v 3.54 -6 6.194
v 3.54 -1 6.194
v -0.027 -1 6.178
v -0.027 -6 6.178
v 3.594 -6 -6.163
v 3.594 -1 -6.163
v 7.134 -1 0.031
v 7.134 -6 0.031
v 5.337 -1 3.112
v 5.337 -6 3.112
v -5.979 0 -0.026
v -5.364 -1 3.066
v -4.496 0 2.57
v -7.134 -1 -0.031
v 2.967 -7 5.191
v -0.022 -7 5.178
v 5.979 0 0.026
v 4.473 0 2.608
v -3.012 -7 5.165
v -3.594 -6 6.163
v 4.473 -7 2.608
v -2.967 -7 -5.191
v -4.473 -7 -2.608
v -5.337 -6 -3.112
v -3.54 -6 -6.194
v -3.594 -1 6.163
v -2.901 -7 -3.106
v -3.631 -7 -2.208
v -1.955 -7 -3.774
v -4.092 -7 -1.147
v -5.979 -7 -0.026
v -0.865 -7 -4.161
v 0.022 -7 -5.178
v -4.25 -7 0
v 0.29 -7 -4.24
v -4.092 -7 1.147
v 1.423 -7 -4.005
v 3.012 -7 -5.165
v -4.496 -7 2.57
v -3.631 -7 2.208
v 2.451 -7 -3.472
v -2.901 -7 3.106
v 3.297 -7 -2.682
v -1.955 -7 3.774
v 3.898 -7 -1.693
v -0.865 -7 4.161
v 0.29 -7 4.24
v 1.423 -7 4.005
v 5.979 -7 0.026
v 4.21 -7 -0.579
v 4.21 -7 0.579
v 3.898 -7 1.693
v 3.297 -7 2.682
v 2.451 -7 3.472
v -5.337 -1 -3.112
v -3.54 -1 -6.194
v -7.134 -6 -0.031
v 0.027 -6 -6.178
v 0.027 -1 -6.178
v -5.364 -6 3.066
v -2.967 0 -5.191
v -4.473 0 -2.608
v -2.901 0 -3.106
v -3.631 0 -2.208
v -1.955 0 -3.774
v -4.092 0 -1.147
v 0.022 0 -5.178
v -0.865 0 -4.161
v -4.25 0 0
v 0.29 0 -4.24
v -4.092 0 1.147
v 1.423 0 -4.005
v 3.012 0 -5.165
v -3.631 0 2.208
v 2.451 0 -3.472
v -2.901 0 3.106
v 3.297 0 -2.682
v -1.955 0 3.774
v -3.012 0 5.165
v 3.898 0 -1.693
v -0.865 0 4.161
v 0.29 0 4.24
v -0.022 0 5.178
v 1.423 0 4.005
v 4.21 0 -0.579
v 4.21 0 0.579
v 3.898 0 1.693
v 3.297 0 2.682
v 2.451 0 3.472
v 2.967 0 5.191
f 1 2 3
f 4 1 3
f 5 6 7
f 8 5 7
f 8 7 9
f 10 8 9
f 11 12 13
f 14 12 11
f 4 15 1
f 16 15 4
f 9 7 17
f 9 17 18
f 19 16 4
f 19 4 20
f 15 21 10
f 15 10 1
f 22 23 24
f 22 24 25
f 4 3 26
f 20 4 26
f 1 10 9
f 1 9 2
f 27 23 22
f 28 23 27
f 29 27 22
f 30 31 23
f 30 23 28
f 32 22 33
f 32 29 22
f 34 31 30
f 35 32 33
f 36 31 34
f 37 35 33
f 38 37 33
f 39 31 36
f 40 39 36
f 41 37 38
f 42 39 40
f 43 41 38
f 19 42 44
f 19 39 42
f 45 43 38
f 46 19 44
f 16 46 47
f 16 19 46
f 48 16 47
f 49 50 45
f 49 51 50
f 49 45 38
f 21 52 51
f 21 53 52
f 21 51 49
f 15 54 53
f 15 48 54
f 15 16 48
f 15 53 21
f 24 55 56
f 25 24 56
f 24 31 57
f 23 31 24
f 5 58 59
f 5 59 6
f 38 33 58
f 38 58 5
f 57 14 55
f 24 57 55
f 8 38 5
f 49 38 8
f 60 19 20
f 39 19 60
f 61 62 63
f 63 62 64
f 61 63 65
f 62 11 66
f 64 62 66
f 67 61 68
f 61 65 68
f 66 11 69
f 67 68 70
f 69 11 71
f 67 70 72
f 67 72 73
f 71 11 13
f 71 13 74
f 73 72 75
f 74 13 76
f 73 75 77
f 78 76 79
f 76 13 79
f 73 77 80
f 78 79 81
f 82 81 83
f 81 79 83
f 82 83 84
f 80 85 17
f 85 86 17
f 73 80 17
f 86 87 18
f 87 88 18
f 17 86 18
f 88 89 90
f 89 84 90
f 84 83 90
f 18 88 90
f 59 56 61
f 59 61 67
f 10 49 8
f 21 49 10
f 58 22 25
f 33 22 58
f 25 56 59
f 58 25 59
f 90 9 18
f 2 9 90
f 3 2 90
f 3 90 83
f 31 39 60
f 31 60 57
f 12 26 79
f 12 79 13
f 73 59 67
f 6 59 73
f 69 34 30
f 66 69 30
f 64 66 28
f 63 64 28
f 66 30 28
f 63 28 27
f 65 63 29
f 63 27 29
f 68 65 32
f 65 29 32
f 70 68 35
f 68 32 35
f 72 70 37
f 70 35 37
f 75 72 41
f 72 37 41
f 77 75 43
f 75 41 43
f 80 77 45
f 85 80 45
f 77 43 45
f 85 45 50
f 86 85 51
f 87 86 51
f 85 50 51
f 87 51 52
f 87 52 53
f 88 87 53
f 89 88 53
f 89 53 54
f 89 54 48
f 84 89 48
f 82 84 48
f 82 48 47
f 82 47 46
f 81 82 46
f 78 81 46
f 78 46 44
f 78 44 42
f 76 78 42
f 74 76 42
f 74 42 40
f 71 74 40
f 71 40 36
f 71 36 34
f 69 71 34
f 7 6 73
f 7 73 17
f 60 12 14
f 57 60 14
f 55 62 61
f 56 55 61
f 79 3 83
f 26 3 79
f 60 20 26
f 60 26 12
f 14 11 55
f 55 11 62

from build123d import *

# Parameters (mm, degrees)
F1_DEPTH = 7
F2_SIZE  = 1
F3_SIZE  = 1
F4_D     = 8.5


with BuildPart() as f1:
    # F0 (on Front) → F1 (new body)
    with BuildSketch(Plane.XZ):
        with BuildLine():
            ThreePointArc((5.3637862302, -3.0659549776), (5.9711339811, -1.5861404815), (6.178210311, 0))
            ThreePointArc((6.178210311, 0), (5.9642239682, 1.6119290011), (5.3370880527, 3.1121975781))
            ThreePointArc((5.3370880527, 3.1121975781), (3.0659549821, 5.3637862276), (-0.0266982871, 6.1781526243))
            ThreePointArc((-0.0266982871, 6.1781526243), (-3.1121976822, 5.337087992), (-5.3637862362, 3.065954967))
            ThreePointArc((-5.3637862362, 3.065954967), (-6.1781526243, -0.0266982826), (-5.3370879532, -3.1121977488))
            ThreePointArc((-5.3370879532, -3.1121977488), (-3.0659548546, -5.3637863004), (0.026698383, -6.1781526239))
            ThreePointArc((0.026698383, -6.1781526239), (3.1121977184, -5.3370879709), (5.3637862302, -3.0659549776))
        make_face()
        with BuildLine():
            ThreePointArc((5.3370880527, 3.1121975781), (5.9642239682, 1.6119290011), (6.178210311, 0))
            ThreePointArc((6.178210311, 0), (5.9711339811, -1.5861404815), (5.3637862302, -3.0659549776))
            Line((5.3637862302, -3.0659549776), (7.1339161613, 0.0308285647))
            Line((7.1339161613, 0.0308285647), (5.3370880527, 3.1121975781))
        make_face()
        with BuildLine():
            ThreePointArc((-0.0266982871, 6.1781526243), (3.0659549821, 5.3637862276), (5.3370880527, 3.1121975781))
            Line((5.3370880527, 3.1121975781), (3.5402597604, 6.1935669065))
            Line((3.5402597604, 6.1935669065), (-0.0266982871, 6.1781526243))
        make_face()
        with BuildLine():
            Line((3.5936564009, -6.1627383418), (5.3637862302, -3.0659549776))
            ThreePointArc((5.3637862302, -3.0659549776), (3.1121977184, -5.3370879709), (0.026698383, -6.1781526239))
            Line((0.026698383, -6.1781526239), (3.5936564009, -6.1627383418))
        make_face()
        with BuildLine():
            ThreePointArc((-5.3637862362, 3.065954967), (-3.1121976822, 5.337087992), (-0.0266982871, 6.1781526243))
            Line((-0.0266982871, 6.1781526243), (-3.5936564009, 6.1627383418))
            Line((-3.5936564009, 6.1627383418), (-5.3637862362, 3.065954967))
        make_face()
        with BuildLine():
            Line((-3.5402597604, -6.1935669065), (0.026698383, -6.1781526239))
            ThreePointArc((0.026698383, -6.1781526239), (-3.0659548546, -5.3637863004), (-5.3370879532, -3.1121977488))
            Line((-5.3370879532, -3.1121977488), (-3.5402597604, -6.1935669065))
        make_face()
        with BuildLine():
            ThreePointArc((-5.3370879532, -3.1121977488), (-6.1781526243, -0.0266982826), (-5.3637862362, 3.065954967))
            Line((-5.3637862362, 3.065954967), (-7.1339161613, -0.0308285647))
            Line((-7.1339161613, -0.0308285647), (-5.3370879532, -3.1121977488))
        make_face()
    extrude(amount=F1_DEPTH)

    # F2
    f2_edges = [f1.edges().sort_by_distance(p)[0] for p in [
        (-5.363786, -7, 3.065955),
        (-0.026698, -7, 6.178153),
        (5.337088, -7, 3.112198),
        (5.363786, -7, -3.065955),
        (0.026698, -7, -6.178153),
        (-5.337088, -7, -3.112198),
    ]]
    chamfer(f2_edges, length=F2_SIZE)

    # F3
    f3_edges = [f1.edges().sort_by_distance(p)[0] for p in [
        (5.337088, 0, 3.112198),
        (-0.026698, 0, 6.178153),
        (-5.363786, 0, 3.065955),
        (-5.337088, 0, -3.112198),
        (0.026698, 0, -6.178153),
        (5.363786, 0, -3.065955),
    ]]
    chamfer(f3_edges, length=F3_SIZE)

    # F4 (through all)
    with Locations(Plane(origin=(0, 0, 0), x_dir=(1, 0, 0), z_dir=(0, 1, 0))):
        with Locations((0, 0)):
            Hole(F4_D / 2)


solid = f1.part
